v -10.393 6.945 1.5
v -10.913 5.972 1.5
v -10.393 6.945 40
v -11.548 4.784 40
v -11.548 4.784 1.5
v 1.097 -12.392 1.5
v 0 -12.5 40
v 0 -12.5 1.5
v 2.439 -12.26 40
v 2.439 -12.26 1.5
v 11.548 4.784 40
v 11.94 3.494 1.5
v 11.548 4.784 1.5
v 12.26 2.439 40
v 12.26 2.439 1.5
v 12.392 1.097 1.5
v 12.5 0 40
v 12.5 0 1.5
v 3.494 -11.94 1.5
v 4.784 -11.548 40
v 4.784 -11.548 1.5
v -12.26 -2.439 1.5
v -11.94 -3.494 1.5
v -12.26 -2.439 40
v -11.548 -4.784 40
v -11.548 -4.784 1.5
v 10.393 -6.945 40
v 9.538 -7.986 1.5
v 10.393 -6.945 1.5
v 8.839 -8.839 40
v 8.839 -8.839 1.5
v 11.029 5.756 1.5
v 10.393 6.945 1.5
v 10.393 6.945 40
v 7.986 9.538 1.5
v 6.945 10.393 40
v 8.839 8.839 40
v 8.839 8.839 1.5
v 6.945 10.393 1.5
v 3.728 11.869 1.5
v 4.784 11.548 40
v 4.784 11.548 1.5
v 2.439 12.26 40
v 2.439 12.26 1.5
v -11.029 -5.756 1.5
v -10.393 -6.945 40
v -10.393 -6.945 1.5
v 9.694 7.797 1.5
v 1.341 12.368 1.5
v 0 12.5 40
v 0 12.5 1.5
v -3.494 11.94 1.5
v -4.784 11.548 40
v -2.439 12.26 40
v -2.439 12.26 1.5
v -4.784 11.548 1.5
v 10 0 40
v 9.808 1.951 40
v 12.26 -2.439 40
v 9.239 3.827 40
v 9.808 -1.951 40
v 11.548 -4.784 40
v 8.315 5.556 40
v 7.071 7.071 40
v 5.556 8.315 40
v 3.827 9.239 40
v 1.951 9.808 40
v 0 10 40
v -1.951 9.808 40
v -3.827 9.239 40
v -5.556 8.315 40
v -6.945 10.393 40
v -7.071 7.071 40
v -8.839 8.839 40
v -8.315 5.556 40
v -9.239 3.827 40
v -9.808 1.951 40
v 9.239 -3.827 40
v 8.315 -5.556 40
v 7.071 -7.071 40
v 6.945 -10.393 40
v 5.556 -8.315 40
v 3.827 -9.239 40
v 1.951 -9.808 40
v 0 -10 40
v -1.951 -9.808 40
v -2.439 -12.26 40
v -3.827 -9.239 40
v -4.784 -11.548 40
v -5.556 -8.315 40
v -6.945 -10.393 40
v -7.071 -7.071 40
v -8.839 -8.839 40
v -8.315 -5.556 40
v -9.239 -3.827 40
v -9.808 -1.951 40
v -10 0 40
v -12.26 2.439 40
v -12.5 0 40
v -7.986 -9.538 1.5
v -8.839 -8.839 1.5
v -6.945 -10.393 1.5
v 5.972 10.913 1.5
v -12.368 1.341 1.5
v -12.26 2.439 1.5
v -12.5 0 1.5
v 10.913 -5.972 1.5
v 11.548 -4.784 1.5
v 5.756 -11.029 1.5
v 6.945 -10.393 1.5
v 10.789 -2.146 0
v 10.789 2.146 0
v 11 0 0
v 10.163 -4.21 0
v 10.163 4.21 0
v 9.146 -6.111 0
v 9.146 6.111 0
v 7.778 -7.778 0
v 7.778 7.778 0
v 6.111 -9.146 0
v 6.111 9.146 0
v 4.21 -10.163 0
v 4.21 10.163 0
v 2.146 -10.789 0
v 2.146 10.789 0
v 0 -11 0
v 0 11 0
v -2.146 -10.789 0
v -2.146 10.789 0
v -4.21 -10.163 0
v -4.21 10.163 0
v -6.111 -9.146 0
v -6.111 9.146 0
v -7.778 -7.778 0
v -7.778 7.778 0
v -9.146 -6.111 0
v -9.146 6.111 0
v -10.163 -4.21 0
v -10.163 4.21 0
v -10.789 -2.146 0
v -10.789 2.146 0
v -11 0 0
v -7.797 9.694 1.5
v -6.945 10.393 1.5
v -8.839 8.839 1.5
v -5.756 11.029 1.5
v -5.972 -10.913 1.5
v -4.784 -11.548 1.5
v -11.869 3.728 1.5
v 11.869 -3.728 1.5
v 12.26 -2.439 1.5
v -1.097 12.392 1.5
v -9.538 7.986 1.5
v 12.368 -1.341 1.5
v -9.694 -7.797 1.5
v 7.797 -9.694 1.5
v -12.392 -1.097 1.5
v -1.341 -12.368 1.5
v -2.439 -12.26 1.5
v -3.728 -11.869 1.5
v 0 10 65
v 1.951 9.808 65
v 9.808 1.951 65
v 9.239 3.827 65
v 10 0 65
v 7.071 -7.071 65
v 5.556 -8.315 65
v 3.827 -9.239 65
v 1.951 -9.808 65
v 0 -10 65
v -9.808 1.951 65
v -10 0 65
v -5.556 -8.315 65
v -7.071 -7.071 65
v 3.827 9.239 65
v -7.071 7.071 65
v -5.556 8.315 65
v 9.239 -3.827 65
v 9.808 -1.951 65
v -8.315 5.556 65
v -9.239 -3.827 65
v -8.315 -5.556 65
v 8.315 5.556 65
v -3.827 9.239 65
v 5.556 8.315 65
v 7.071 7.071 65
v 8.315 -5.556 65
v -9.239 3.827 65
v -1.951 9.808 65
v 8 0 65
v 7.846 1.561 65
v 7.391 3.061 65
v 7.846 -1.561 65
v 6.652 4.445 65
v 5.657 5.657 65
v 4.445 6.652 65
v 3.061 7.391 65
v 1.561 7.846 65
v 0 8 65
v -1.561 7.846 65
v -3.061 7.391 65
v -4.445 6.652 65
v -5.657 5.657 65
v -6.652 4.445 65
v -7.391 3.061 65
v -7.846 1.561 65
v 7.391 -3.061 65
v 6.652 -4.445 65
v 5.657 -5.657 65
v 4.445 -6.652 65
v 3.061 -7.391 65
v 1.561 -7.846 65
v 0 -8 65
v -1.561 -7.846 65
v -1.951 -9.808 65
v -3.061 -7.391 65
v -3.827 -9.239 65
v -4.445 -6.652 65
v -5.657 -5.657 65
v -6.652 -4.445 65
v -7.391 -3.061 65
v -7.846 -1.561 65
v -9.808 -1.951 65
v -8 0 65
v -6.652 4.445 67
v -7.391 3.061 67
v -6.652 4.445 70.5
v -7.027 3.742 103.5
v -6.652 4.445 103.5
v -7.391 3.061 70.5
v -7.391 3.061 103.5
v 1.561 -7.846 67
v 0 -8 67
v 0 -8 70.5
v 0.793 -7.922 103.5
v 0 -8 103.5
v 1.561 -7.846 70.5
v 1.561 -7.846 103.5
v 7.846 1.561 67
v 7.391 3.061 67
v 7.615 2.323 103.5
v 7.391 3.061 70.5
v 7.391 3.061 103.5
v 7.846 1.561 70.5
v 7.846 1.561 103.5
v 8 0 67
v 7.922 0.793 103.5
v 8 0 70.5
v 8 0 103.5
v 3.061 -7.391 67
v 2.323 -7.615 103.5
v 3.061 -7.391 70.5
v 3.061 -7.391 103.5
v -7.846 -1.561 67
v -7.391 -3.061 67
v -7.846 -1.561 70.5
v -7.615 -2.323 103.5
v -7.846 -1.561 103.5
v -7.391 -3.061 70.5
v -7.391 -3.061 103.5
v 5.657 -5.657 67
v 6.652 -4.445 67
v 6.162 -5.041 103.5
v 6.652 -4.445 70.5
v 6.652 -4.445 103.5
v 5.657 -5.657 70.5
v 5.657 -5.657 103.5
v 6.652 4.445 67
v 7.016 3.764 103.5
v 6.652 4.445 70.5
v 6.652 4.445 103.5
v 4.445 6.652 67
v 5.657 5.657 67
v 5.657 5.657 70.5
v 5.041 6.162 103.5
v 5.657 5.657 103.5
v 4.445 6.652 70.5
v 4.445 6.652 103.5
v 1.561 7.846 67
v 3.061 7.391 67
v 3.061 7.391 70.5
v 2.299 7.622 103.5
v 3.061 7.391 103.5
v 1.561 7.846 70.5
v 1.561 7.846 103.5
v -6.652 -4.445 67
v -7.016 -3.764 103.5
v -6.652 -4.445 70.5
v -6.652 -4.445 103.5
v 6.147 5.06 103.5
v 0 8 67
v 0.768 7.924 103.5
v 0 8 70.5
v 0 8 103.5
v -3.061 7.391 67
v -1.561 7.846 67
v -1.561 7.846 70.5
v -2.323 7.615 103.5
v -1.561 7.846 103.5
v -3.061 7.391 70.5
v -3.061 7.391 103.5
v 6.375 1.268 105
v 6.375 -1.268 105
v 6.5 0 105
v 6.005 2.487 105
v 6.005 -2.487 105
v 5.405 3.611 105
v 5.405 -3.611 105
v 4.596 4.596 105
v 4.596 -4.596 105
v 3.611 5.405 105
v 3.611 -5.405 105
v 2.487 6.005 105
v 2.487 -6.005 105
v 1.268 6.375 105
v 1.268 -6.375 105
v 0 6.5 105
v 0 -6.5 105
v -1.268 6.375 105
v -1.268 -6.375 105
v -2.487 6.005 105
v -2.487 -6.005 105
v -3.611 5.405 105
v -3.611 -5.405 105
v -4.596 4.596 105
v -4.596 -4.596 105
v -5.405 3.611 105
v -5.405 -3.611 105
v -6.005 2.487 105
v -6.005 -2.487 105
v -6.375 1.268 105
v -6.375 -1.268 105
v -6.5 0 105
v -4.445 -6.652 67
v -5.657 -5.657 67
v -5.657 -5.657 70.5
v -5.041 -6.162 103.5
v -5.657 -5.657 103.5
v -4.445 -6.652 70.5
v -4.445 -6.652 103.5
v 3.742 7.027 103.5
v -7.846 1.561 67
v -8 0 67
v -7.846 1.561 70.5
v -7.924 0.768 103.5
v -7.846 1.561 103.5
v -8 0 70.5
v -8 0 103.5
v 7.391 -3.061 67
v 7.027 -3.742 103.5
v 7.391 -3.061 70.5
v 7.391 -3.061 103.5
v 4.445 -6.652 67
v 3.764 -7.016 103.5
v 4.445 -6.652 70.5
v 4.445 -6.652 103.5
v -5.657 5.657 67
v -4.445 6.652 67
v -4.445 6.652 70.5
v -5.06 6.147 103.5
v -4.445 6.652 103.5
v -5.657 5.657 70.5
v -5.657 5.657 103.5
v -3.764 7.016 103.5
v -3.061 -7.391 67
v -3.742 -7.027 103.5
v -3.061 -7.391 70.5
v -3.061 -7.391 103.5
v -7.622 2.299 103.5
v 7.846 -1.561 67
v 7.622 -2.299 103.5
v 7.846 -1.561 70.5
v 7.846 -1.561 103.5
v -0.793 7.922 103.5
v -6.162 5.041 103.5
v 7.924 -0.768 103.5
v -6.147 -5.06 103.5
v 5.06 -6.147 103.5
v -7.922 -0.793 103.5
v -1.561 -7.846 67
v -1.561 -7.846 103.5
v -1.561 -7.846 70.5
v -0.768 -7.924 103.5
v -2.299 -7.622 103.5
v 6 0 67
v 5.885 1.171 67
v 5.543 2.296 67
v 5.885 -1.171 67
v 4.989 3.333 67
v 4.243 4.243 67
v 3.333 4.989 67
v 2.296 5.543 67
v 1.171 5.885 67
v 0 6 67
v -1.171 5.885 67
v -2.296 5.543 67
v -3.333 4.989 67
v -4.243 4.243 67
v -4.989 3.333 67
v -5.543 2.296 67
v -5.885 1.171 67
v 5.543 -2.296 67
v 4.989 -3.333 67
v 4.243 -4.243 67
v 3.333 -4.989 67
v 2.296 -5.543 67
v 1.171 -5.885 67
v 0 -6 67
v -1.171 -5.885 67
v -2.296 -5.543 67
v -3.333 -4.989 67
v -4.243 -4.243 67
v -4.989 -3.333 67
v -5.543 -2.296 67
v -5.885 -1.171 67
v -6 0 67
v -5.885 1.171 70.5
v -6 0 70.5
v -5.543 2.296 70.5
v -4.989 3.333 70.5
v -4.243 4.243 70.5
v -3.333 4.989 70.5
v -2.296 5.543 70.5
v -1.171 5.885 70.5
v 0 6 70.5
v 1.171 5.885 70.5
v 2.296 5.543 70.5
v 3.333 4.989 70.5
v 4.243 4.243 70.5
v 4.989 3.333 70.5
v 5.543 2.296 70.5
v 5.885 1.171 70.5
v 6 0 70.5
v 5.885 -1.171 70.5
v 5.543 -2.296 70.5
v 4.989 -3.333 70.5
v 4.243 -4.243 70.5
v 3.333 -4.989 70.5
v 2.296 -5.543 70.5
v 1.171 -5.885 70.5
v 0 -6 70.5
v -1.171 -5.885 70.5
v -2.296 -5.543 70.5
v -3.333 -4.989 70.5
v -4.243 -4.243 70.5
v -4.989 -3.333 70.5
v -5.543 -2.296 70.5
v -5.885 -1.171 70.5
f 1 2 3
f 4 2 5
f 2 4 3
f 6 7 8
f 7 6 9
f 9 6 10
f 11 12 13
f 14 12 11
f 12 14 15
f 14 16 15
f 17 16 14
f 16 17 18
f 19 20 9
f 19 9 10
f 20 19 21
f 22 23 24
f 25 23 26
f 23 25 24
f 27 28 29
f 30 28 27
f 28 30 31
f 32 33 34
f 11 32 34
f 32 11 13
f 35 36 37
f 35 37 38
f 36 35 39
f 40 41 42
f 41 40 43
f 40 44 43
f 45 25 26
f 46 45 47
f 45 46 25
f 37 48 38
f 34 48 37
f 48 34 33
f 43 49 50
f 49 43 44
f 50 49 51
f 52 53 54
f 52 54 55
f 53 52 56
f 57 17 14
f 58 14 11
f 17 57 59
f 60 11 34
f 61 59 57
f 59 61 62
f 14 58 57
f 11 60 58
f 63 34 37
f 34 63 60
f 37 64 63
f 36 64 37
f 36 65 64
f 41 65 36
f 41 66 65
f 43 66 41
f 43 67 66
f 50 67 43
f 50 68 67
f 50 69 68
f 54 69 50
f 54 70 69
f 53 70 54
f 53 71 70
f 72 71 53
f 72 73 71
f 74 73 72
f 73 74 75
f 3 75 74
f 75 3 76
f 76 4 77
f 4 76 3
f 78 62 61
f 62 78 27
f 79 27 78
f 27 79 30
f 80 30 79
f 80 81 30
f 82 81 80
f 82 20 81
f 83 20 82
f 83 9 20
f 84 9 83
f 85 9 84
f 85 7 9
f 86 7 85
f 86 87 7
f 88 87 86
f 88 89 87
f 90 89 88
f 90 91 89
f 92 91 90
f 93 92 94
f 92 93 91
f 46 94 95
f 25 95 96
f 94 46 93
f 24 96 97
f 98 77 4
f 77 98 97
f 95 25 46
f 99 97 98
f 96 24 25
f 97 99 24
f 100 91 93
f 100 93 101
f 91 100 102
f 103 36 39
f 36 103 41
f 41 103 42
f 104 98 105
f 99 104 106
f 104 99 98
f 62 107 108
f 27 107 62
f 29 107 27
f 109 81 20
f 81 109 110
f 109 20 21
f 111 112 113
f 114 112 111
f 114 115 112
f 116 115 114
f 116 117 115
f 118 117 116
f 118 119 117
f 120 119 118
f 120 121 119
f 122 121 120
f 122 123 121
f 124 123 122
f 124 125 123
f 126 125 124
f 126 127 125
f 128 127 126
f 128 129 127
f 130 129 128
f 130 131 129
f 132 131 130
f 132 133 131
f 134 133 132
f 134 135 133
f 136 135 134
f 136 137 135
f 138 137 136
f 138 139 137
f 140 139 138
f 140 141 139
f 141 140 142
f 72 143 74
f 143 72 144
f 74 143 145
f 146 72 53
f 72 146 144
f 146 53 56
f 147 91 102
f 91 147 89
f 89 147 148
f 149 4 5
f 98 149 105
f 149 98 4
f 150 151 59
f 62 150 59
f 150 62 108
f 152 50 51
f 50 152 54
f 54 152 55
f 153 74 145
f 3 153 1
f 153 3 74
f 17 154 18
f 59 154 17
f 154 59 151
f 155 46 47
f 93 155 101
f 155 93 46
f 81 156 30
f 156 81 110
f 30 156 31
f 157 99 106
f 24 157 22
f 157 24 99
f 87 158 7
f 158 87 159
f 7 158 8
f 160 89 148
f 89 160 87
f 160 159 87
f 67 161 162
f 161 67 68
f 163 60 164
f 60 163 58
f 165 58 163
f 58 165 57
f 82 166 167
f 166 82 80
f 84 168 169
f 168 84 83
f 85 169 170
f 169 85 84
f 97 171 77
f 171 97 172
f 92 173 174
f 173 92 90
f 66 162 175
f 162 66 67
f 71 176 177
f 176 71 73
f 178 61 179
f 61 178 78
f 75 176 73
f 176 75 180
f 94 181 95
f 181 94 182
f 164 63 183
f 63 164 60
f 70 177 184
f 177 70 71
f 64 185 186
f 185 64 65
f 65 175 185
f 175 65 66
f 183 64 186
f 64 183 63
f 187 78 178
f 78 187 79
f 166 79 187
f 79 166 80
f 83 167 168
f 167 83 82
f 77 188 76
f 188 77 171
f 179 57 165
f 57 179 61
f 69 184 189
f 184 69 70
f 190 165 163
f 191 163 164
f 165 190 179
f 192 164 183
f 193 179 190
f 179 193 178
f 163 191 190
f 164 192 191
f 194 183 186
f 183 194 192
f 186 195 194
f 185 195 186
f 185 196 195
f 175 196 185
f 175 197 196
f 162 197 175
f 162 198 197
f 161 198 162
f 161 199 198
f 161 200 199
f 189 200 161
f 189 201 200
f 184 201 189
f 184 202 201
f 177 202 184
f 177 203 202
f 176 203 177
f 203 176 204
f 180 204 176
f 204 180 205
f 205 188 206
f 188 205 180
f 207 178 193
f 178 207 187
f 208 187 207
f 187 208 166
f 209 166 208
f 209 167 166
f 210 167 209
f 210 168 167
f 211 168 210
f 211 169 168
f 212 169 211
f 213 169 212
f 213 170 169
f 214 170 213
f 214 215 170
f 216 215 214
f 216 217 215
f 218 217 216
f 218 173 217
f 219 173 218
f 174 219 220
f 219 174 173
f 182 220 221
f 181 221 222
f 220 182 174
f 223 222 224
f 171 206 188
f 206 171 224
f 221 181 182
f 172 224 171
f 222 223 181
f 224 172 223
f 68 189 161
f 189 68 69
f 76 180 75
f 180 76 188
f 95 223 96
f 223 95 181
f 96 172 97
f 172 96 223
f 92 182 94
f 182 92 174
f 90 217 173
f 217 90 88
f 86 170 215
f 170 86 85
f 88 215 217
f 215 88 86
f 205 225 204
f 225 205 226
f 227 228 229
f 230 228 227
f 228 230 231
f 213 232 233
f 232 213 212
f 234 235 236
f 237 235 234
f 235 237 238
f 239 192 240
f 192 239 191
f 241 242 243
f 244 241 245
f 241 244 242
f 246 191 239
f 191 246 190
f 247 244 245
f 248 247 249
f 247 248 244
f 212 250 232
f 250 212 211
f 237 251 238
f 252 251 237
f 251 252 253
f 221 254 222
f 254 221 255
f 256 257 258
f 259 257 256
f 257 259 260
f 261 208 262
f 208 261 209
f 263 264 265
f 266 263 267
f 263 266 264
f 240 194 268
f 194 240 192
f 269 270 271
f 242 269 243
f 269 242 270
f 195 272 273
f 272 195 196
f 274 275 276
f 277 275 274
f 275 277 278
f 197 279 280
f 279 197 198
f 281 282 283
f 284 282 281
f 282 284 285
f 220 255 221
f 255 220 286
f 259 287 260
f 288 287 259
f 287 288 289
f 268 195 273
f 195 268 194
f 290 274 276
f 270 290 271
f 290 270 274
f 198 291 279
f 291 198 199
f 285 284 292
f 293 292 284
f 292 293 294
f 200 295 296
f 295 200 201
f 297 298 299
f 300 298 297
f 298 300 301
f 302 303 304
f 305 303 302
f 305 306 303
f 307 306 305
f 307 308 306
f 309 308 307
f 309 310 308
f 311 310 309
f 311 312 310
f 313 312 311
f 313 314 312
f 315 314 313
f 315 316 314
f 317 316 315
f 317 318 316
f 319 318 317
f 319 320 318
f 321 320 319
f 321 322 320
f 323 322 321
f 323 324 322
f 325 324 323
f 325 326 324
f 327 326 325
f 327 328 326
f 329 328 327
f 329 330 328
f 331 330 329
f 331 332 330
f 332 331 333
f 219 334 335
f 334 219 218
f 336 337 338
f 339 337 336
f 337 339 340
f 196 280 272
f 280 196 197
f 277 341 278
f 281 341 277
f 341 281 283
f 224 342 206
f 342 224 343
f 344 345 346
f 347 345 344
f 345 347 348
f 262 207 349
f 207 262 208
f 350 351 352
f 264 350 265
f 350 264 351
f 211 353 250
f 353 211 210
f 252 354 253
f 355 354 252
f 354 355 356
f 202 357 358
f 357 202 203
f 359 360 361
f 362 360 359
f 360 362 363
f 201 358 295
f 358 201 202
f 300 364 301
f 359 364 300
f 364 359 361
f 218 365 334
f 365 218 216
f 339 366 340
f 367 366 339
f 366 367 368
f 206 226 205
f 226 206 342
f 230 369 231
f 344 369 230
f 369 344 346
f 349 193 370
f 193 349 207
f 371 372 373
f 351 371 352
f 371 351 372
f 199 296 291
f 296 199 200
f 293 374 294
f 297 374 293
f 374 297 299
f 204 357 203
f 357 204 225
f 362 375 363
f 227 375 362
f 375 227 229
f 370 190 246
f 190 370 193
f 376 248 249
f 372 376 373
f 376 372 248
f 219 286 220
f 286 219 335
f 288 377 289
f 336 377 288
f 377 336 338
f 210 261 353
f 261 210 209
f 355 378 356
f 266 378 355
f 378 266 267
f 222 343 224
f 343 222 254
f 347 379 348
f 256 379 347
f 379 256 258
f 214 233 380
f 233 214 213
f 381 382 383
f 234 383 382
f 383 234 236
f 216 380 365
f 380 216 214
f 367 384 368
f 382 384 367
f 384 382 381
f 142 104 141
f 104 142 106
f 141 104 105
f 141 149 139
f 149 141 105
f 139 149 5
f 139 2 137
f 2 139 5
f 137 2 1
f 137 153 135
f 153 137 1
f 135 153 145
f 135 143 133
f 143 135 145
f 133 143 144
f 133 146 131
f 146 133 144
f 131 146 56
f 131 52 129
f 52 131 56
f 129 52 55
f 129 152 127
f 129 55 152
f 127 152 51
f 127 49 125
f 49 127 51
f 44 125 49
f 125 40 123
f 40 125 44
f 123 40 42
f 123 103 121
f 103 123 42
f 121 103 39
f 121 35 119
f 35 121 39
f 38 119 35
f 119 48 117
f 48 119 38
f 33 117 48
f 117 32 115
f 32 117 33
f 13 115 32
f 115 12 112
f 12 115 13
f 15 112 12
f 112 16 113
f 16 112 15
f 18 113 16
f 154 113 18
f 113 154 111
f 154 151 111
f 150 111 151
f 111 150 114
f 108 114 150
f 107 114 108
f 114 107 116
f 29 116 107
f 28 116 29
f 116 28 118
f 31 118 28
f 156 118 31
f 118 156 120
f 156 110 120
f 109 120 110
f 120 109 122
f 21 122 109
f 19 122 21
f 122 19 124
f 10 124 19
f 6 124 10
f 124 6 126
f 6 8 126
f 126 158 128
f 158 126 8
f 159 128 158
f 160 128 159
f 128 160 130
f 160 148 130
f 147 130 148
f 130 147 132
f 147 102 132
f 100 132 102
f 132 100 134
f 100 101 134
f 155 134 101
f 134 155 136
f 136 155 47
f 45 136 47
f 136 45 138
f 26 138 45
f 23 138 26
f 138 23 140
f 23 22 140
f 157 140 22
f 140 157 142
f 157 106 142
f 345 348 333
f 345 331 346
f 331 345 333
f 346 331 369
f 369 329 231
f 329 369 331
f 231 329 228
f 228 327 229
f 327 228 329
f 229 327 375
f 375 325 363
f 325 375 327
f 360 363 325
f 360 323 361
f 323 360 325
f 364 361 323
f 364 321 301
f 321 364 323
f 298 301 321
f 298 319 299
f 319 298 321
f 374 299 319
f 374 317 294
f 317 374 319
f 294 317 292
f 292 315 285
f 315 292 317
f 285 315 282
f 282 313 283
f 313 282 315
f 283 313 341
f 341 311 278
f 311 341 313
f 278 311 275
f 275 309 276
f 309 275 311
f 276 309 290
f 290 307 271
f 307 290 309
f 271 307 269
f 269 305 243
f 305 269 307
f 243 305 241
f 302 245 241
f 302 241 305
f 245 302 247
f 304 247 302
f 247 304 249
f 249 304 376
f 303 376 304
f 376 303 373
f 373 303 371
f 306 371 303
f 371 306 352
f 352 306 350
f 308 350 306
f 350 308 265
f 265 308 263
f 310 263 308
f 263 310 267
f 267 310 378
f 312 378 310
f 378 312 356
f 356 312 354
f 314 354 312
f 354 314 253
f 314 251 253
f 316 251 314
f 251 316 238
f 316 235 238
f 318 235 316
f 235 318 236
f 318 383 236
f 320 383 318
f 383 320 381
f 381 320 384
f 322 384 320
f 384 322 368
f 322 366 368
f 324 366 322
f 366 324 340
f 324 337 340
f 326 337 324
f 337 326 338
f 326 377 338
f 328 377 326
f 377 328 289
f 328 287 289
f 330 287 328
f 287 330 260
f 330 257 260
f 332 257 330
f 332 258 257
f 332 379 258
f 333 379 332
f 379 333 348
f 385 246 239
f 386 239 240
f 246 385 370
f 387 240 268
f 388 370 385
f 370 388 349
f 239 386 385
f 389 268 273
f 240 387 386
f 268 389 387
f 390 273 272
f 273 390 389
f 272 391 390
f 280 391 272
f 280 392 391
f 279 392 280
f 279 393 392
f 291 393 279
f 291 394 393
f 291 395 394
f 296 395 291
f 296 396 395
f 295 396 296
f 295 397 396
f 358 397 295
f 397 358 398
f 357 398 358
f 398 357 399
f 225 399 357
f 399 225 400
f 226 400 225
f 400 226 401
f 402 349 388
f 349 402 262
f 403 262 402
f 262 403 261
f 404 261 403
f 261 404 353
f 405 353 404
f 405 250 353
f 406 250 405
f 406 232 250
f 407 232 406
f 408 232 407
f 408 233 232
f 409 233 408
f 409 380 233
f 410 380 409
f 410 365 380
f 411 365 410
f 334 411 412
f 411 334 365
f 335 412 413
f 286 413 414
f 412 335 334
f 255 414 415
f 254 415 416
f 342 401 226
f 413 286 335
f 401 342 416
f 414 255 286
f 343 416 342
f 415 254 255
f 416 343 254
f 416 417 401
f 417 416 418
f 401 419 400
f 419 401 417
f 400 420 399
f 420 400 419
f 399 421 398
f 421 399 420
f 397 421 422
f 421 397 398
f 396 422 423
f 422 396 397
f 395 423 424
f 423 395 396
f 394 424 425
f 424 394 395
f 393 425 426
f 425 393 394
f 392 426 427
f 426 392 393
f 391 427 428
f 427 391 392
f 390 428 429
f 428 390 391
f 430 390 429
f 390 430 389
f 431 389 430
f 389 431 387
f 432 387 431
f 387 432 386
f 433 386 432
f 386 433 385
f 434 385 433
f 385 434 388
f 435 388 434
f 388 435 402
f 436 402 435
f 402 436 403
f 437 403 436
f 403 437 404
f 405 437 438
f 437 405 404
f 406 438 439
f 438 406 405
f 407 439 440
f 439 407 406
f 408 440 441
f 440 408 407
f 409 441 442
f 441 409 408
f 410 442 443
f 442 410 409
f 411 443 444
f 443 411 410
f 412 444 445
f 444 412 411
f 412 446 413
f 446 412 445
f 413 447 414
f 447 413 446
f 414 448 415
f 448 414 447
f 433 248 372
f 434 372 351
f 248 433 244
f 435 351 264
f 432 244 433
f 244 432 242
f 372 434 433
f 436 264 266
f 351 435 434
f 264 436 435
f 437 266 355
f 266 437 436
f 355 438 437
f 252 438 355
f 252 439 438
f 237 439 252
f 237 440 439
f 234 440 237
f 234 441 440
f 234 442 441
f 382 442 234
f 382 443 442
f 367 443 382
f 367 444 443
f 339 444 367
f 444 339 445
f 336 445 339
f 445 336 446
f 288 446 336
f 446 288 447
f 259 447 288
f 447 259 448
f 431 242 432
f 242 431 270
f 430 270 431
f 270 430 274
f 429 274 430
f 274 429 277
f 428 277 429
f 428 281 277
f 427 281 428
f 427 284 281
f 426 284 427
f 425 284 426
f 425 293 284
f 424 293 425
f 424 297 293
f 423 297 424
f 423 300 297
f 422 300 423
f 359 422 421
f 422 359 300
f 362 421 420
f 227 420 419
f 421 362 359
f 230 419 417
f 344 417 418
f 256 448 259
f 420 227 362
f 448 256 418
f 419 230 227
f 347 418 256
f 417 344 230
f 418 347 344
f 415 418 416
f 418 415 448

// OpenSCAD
$fn = 32;

// ----------------------------------------------------------------------
// Stepped shaft: diameters 25, 20, 16 mm, 105 mm long
// ----------------------------------------------------------------------

// --- parameters (mm) ---
d1 = 25;                  // step 1 diameter
len1 = 40;                // step 1 length
d2 = 20;                  // step 2 diameter
len2 = 25;                // step 2 length
d3 = 16;                  // step 3 diameter
len3 = 40;                // step 3 length
total = 105;              // overall length
chamfer = 1.5;            // end chamfer
groove_r = 8;             // groove radius
groove_z = 67;            // groove position from the end
groove_w = 3.5;           // groove width
groove_d = 2;             // groove depth

difference() {
  /* turned body: stacked cylinders, every step sunk into the bigger one */
  union() {
    cylinder(h = len1, d = d1);
    translate([0, 0, 39.6]) cylinder(h = 25.4, d = d2);
    translate([0, 0, 64.6]) cylinder(h = 40.4, d = d3);
  }
  /* bottom chamfer ring cut */
  rotate_extrude() translate([11, -2.5]) polygon([[0, 0], [4, 0], [4, 6.5], [0, 2.5]]);
  /* top chamfer ring cut */
  rotate_extrude() translate([6.5, 105]) polygon([[0, 0], [4, -4], [4, 2.5], [0, 2.5]]);
  /* circlip groove just behind the shoulder */
  rotate_extrude() translate([groove_r - groove_d, groove_z]) square([groove_d + 2.5, groove_w]);
}
